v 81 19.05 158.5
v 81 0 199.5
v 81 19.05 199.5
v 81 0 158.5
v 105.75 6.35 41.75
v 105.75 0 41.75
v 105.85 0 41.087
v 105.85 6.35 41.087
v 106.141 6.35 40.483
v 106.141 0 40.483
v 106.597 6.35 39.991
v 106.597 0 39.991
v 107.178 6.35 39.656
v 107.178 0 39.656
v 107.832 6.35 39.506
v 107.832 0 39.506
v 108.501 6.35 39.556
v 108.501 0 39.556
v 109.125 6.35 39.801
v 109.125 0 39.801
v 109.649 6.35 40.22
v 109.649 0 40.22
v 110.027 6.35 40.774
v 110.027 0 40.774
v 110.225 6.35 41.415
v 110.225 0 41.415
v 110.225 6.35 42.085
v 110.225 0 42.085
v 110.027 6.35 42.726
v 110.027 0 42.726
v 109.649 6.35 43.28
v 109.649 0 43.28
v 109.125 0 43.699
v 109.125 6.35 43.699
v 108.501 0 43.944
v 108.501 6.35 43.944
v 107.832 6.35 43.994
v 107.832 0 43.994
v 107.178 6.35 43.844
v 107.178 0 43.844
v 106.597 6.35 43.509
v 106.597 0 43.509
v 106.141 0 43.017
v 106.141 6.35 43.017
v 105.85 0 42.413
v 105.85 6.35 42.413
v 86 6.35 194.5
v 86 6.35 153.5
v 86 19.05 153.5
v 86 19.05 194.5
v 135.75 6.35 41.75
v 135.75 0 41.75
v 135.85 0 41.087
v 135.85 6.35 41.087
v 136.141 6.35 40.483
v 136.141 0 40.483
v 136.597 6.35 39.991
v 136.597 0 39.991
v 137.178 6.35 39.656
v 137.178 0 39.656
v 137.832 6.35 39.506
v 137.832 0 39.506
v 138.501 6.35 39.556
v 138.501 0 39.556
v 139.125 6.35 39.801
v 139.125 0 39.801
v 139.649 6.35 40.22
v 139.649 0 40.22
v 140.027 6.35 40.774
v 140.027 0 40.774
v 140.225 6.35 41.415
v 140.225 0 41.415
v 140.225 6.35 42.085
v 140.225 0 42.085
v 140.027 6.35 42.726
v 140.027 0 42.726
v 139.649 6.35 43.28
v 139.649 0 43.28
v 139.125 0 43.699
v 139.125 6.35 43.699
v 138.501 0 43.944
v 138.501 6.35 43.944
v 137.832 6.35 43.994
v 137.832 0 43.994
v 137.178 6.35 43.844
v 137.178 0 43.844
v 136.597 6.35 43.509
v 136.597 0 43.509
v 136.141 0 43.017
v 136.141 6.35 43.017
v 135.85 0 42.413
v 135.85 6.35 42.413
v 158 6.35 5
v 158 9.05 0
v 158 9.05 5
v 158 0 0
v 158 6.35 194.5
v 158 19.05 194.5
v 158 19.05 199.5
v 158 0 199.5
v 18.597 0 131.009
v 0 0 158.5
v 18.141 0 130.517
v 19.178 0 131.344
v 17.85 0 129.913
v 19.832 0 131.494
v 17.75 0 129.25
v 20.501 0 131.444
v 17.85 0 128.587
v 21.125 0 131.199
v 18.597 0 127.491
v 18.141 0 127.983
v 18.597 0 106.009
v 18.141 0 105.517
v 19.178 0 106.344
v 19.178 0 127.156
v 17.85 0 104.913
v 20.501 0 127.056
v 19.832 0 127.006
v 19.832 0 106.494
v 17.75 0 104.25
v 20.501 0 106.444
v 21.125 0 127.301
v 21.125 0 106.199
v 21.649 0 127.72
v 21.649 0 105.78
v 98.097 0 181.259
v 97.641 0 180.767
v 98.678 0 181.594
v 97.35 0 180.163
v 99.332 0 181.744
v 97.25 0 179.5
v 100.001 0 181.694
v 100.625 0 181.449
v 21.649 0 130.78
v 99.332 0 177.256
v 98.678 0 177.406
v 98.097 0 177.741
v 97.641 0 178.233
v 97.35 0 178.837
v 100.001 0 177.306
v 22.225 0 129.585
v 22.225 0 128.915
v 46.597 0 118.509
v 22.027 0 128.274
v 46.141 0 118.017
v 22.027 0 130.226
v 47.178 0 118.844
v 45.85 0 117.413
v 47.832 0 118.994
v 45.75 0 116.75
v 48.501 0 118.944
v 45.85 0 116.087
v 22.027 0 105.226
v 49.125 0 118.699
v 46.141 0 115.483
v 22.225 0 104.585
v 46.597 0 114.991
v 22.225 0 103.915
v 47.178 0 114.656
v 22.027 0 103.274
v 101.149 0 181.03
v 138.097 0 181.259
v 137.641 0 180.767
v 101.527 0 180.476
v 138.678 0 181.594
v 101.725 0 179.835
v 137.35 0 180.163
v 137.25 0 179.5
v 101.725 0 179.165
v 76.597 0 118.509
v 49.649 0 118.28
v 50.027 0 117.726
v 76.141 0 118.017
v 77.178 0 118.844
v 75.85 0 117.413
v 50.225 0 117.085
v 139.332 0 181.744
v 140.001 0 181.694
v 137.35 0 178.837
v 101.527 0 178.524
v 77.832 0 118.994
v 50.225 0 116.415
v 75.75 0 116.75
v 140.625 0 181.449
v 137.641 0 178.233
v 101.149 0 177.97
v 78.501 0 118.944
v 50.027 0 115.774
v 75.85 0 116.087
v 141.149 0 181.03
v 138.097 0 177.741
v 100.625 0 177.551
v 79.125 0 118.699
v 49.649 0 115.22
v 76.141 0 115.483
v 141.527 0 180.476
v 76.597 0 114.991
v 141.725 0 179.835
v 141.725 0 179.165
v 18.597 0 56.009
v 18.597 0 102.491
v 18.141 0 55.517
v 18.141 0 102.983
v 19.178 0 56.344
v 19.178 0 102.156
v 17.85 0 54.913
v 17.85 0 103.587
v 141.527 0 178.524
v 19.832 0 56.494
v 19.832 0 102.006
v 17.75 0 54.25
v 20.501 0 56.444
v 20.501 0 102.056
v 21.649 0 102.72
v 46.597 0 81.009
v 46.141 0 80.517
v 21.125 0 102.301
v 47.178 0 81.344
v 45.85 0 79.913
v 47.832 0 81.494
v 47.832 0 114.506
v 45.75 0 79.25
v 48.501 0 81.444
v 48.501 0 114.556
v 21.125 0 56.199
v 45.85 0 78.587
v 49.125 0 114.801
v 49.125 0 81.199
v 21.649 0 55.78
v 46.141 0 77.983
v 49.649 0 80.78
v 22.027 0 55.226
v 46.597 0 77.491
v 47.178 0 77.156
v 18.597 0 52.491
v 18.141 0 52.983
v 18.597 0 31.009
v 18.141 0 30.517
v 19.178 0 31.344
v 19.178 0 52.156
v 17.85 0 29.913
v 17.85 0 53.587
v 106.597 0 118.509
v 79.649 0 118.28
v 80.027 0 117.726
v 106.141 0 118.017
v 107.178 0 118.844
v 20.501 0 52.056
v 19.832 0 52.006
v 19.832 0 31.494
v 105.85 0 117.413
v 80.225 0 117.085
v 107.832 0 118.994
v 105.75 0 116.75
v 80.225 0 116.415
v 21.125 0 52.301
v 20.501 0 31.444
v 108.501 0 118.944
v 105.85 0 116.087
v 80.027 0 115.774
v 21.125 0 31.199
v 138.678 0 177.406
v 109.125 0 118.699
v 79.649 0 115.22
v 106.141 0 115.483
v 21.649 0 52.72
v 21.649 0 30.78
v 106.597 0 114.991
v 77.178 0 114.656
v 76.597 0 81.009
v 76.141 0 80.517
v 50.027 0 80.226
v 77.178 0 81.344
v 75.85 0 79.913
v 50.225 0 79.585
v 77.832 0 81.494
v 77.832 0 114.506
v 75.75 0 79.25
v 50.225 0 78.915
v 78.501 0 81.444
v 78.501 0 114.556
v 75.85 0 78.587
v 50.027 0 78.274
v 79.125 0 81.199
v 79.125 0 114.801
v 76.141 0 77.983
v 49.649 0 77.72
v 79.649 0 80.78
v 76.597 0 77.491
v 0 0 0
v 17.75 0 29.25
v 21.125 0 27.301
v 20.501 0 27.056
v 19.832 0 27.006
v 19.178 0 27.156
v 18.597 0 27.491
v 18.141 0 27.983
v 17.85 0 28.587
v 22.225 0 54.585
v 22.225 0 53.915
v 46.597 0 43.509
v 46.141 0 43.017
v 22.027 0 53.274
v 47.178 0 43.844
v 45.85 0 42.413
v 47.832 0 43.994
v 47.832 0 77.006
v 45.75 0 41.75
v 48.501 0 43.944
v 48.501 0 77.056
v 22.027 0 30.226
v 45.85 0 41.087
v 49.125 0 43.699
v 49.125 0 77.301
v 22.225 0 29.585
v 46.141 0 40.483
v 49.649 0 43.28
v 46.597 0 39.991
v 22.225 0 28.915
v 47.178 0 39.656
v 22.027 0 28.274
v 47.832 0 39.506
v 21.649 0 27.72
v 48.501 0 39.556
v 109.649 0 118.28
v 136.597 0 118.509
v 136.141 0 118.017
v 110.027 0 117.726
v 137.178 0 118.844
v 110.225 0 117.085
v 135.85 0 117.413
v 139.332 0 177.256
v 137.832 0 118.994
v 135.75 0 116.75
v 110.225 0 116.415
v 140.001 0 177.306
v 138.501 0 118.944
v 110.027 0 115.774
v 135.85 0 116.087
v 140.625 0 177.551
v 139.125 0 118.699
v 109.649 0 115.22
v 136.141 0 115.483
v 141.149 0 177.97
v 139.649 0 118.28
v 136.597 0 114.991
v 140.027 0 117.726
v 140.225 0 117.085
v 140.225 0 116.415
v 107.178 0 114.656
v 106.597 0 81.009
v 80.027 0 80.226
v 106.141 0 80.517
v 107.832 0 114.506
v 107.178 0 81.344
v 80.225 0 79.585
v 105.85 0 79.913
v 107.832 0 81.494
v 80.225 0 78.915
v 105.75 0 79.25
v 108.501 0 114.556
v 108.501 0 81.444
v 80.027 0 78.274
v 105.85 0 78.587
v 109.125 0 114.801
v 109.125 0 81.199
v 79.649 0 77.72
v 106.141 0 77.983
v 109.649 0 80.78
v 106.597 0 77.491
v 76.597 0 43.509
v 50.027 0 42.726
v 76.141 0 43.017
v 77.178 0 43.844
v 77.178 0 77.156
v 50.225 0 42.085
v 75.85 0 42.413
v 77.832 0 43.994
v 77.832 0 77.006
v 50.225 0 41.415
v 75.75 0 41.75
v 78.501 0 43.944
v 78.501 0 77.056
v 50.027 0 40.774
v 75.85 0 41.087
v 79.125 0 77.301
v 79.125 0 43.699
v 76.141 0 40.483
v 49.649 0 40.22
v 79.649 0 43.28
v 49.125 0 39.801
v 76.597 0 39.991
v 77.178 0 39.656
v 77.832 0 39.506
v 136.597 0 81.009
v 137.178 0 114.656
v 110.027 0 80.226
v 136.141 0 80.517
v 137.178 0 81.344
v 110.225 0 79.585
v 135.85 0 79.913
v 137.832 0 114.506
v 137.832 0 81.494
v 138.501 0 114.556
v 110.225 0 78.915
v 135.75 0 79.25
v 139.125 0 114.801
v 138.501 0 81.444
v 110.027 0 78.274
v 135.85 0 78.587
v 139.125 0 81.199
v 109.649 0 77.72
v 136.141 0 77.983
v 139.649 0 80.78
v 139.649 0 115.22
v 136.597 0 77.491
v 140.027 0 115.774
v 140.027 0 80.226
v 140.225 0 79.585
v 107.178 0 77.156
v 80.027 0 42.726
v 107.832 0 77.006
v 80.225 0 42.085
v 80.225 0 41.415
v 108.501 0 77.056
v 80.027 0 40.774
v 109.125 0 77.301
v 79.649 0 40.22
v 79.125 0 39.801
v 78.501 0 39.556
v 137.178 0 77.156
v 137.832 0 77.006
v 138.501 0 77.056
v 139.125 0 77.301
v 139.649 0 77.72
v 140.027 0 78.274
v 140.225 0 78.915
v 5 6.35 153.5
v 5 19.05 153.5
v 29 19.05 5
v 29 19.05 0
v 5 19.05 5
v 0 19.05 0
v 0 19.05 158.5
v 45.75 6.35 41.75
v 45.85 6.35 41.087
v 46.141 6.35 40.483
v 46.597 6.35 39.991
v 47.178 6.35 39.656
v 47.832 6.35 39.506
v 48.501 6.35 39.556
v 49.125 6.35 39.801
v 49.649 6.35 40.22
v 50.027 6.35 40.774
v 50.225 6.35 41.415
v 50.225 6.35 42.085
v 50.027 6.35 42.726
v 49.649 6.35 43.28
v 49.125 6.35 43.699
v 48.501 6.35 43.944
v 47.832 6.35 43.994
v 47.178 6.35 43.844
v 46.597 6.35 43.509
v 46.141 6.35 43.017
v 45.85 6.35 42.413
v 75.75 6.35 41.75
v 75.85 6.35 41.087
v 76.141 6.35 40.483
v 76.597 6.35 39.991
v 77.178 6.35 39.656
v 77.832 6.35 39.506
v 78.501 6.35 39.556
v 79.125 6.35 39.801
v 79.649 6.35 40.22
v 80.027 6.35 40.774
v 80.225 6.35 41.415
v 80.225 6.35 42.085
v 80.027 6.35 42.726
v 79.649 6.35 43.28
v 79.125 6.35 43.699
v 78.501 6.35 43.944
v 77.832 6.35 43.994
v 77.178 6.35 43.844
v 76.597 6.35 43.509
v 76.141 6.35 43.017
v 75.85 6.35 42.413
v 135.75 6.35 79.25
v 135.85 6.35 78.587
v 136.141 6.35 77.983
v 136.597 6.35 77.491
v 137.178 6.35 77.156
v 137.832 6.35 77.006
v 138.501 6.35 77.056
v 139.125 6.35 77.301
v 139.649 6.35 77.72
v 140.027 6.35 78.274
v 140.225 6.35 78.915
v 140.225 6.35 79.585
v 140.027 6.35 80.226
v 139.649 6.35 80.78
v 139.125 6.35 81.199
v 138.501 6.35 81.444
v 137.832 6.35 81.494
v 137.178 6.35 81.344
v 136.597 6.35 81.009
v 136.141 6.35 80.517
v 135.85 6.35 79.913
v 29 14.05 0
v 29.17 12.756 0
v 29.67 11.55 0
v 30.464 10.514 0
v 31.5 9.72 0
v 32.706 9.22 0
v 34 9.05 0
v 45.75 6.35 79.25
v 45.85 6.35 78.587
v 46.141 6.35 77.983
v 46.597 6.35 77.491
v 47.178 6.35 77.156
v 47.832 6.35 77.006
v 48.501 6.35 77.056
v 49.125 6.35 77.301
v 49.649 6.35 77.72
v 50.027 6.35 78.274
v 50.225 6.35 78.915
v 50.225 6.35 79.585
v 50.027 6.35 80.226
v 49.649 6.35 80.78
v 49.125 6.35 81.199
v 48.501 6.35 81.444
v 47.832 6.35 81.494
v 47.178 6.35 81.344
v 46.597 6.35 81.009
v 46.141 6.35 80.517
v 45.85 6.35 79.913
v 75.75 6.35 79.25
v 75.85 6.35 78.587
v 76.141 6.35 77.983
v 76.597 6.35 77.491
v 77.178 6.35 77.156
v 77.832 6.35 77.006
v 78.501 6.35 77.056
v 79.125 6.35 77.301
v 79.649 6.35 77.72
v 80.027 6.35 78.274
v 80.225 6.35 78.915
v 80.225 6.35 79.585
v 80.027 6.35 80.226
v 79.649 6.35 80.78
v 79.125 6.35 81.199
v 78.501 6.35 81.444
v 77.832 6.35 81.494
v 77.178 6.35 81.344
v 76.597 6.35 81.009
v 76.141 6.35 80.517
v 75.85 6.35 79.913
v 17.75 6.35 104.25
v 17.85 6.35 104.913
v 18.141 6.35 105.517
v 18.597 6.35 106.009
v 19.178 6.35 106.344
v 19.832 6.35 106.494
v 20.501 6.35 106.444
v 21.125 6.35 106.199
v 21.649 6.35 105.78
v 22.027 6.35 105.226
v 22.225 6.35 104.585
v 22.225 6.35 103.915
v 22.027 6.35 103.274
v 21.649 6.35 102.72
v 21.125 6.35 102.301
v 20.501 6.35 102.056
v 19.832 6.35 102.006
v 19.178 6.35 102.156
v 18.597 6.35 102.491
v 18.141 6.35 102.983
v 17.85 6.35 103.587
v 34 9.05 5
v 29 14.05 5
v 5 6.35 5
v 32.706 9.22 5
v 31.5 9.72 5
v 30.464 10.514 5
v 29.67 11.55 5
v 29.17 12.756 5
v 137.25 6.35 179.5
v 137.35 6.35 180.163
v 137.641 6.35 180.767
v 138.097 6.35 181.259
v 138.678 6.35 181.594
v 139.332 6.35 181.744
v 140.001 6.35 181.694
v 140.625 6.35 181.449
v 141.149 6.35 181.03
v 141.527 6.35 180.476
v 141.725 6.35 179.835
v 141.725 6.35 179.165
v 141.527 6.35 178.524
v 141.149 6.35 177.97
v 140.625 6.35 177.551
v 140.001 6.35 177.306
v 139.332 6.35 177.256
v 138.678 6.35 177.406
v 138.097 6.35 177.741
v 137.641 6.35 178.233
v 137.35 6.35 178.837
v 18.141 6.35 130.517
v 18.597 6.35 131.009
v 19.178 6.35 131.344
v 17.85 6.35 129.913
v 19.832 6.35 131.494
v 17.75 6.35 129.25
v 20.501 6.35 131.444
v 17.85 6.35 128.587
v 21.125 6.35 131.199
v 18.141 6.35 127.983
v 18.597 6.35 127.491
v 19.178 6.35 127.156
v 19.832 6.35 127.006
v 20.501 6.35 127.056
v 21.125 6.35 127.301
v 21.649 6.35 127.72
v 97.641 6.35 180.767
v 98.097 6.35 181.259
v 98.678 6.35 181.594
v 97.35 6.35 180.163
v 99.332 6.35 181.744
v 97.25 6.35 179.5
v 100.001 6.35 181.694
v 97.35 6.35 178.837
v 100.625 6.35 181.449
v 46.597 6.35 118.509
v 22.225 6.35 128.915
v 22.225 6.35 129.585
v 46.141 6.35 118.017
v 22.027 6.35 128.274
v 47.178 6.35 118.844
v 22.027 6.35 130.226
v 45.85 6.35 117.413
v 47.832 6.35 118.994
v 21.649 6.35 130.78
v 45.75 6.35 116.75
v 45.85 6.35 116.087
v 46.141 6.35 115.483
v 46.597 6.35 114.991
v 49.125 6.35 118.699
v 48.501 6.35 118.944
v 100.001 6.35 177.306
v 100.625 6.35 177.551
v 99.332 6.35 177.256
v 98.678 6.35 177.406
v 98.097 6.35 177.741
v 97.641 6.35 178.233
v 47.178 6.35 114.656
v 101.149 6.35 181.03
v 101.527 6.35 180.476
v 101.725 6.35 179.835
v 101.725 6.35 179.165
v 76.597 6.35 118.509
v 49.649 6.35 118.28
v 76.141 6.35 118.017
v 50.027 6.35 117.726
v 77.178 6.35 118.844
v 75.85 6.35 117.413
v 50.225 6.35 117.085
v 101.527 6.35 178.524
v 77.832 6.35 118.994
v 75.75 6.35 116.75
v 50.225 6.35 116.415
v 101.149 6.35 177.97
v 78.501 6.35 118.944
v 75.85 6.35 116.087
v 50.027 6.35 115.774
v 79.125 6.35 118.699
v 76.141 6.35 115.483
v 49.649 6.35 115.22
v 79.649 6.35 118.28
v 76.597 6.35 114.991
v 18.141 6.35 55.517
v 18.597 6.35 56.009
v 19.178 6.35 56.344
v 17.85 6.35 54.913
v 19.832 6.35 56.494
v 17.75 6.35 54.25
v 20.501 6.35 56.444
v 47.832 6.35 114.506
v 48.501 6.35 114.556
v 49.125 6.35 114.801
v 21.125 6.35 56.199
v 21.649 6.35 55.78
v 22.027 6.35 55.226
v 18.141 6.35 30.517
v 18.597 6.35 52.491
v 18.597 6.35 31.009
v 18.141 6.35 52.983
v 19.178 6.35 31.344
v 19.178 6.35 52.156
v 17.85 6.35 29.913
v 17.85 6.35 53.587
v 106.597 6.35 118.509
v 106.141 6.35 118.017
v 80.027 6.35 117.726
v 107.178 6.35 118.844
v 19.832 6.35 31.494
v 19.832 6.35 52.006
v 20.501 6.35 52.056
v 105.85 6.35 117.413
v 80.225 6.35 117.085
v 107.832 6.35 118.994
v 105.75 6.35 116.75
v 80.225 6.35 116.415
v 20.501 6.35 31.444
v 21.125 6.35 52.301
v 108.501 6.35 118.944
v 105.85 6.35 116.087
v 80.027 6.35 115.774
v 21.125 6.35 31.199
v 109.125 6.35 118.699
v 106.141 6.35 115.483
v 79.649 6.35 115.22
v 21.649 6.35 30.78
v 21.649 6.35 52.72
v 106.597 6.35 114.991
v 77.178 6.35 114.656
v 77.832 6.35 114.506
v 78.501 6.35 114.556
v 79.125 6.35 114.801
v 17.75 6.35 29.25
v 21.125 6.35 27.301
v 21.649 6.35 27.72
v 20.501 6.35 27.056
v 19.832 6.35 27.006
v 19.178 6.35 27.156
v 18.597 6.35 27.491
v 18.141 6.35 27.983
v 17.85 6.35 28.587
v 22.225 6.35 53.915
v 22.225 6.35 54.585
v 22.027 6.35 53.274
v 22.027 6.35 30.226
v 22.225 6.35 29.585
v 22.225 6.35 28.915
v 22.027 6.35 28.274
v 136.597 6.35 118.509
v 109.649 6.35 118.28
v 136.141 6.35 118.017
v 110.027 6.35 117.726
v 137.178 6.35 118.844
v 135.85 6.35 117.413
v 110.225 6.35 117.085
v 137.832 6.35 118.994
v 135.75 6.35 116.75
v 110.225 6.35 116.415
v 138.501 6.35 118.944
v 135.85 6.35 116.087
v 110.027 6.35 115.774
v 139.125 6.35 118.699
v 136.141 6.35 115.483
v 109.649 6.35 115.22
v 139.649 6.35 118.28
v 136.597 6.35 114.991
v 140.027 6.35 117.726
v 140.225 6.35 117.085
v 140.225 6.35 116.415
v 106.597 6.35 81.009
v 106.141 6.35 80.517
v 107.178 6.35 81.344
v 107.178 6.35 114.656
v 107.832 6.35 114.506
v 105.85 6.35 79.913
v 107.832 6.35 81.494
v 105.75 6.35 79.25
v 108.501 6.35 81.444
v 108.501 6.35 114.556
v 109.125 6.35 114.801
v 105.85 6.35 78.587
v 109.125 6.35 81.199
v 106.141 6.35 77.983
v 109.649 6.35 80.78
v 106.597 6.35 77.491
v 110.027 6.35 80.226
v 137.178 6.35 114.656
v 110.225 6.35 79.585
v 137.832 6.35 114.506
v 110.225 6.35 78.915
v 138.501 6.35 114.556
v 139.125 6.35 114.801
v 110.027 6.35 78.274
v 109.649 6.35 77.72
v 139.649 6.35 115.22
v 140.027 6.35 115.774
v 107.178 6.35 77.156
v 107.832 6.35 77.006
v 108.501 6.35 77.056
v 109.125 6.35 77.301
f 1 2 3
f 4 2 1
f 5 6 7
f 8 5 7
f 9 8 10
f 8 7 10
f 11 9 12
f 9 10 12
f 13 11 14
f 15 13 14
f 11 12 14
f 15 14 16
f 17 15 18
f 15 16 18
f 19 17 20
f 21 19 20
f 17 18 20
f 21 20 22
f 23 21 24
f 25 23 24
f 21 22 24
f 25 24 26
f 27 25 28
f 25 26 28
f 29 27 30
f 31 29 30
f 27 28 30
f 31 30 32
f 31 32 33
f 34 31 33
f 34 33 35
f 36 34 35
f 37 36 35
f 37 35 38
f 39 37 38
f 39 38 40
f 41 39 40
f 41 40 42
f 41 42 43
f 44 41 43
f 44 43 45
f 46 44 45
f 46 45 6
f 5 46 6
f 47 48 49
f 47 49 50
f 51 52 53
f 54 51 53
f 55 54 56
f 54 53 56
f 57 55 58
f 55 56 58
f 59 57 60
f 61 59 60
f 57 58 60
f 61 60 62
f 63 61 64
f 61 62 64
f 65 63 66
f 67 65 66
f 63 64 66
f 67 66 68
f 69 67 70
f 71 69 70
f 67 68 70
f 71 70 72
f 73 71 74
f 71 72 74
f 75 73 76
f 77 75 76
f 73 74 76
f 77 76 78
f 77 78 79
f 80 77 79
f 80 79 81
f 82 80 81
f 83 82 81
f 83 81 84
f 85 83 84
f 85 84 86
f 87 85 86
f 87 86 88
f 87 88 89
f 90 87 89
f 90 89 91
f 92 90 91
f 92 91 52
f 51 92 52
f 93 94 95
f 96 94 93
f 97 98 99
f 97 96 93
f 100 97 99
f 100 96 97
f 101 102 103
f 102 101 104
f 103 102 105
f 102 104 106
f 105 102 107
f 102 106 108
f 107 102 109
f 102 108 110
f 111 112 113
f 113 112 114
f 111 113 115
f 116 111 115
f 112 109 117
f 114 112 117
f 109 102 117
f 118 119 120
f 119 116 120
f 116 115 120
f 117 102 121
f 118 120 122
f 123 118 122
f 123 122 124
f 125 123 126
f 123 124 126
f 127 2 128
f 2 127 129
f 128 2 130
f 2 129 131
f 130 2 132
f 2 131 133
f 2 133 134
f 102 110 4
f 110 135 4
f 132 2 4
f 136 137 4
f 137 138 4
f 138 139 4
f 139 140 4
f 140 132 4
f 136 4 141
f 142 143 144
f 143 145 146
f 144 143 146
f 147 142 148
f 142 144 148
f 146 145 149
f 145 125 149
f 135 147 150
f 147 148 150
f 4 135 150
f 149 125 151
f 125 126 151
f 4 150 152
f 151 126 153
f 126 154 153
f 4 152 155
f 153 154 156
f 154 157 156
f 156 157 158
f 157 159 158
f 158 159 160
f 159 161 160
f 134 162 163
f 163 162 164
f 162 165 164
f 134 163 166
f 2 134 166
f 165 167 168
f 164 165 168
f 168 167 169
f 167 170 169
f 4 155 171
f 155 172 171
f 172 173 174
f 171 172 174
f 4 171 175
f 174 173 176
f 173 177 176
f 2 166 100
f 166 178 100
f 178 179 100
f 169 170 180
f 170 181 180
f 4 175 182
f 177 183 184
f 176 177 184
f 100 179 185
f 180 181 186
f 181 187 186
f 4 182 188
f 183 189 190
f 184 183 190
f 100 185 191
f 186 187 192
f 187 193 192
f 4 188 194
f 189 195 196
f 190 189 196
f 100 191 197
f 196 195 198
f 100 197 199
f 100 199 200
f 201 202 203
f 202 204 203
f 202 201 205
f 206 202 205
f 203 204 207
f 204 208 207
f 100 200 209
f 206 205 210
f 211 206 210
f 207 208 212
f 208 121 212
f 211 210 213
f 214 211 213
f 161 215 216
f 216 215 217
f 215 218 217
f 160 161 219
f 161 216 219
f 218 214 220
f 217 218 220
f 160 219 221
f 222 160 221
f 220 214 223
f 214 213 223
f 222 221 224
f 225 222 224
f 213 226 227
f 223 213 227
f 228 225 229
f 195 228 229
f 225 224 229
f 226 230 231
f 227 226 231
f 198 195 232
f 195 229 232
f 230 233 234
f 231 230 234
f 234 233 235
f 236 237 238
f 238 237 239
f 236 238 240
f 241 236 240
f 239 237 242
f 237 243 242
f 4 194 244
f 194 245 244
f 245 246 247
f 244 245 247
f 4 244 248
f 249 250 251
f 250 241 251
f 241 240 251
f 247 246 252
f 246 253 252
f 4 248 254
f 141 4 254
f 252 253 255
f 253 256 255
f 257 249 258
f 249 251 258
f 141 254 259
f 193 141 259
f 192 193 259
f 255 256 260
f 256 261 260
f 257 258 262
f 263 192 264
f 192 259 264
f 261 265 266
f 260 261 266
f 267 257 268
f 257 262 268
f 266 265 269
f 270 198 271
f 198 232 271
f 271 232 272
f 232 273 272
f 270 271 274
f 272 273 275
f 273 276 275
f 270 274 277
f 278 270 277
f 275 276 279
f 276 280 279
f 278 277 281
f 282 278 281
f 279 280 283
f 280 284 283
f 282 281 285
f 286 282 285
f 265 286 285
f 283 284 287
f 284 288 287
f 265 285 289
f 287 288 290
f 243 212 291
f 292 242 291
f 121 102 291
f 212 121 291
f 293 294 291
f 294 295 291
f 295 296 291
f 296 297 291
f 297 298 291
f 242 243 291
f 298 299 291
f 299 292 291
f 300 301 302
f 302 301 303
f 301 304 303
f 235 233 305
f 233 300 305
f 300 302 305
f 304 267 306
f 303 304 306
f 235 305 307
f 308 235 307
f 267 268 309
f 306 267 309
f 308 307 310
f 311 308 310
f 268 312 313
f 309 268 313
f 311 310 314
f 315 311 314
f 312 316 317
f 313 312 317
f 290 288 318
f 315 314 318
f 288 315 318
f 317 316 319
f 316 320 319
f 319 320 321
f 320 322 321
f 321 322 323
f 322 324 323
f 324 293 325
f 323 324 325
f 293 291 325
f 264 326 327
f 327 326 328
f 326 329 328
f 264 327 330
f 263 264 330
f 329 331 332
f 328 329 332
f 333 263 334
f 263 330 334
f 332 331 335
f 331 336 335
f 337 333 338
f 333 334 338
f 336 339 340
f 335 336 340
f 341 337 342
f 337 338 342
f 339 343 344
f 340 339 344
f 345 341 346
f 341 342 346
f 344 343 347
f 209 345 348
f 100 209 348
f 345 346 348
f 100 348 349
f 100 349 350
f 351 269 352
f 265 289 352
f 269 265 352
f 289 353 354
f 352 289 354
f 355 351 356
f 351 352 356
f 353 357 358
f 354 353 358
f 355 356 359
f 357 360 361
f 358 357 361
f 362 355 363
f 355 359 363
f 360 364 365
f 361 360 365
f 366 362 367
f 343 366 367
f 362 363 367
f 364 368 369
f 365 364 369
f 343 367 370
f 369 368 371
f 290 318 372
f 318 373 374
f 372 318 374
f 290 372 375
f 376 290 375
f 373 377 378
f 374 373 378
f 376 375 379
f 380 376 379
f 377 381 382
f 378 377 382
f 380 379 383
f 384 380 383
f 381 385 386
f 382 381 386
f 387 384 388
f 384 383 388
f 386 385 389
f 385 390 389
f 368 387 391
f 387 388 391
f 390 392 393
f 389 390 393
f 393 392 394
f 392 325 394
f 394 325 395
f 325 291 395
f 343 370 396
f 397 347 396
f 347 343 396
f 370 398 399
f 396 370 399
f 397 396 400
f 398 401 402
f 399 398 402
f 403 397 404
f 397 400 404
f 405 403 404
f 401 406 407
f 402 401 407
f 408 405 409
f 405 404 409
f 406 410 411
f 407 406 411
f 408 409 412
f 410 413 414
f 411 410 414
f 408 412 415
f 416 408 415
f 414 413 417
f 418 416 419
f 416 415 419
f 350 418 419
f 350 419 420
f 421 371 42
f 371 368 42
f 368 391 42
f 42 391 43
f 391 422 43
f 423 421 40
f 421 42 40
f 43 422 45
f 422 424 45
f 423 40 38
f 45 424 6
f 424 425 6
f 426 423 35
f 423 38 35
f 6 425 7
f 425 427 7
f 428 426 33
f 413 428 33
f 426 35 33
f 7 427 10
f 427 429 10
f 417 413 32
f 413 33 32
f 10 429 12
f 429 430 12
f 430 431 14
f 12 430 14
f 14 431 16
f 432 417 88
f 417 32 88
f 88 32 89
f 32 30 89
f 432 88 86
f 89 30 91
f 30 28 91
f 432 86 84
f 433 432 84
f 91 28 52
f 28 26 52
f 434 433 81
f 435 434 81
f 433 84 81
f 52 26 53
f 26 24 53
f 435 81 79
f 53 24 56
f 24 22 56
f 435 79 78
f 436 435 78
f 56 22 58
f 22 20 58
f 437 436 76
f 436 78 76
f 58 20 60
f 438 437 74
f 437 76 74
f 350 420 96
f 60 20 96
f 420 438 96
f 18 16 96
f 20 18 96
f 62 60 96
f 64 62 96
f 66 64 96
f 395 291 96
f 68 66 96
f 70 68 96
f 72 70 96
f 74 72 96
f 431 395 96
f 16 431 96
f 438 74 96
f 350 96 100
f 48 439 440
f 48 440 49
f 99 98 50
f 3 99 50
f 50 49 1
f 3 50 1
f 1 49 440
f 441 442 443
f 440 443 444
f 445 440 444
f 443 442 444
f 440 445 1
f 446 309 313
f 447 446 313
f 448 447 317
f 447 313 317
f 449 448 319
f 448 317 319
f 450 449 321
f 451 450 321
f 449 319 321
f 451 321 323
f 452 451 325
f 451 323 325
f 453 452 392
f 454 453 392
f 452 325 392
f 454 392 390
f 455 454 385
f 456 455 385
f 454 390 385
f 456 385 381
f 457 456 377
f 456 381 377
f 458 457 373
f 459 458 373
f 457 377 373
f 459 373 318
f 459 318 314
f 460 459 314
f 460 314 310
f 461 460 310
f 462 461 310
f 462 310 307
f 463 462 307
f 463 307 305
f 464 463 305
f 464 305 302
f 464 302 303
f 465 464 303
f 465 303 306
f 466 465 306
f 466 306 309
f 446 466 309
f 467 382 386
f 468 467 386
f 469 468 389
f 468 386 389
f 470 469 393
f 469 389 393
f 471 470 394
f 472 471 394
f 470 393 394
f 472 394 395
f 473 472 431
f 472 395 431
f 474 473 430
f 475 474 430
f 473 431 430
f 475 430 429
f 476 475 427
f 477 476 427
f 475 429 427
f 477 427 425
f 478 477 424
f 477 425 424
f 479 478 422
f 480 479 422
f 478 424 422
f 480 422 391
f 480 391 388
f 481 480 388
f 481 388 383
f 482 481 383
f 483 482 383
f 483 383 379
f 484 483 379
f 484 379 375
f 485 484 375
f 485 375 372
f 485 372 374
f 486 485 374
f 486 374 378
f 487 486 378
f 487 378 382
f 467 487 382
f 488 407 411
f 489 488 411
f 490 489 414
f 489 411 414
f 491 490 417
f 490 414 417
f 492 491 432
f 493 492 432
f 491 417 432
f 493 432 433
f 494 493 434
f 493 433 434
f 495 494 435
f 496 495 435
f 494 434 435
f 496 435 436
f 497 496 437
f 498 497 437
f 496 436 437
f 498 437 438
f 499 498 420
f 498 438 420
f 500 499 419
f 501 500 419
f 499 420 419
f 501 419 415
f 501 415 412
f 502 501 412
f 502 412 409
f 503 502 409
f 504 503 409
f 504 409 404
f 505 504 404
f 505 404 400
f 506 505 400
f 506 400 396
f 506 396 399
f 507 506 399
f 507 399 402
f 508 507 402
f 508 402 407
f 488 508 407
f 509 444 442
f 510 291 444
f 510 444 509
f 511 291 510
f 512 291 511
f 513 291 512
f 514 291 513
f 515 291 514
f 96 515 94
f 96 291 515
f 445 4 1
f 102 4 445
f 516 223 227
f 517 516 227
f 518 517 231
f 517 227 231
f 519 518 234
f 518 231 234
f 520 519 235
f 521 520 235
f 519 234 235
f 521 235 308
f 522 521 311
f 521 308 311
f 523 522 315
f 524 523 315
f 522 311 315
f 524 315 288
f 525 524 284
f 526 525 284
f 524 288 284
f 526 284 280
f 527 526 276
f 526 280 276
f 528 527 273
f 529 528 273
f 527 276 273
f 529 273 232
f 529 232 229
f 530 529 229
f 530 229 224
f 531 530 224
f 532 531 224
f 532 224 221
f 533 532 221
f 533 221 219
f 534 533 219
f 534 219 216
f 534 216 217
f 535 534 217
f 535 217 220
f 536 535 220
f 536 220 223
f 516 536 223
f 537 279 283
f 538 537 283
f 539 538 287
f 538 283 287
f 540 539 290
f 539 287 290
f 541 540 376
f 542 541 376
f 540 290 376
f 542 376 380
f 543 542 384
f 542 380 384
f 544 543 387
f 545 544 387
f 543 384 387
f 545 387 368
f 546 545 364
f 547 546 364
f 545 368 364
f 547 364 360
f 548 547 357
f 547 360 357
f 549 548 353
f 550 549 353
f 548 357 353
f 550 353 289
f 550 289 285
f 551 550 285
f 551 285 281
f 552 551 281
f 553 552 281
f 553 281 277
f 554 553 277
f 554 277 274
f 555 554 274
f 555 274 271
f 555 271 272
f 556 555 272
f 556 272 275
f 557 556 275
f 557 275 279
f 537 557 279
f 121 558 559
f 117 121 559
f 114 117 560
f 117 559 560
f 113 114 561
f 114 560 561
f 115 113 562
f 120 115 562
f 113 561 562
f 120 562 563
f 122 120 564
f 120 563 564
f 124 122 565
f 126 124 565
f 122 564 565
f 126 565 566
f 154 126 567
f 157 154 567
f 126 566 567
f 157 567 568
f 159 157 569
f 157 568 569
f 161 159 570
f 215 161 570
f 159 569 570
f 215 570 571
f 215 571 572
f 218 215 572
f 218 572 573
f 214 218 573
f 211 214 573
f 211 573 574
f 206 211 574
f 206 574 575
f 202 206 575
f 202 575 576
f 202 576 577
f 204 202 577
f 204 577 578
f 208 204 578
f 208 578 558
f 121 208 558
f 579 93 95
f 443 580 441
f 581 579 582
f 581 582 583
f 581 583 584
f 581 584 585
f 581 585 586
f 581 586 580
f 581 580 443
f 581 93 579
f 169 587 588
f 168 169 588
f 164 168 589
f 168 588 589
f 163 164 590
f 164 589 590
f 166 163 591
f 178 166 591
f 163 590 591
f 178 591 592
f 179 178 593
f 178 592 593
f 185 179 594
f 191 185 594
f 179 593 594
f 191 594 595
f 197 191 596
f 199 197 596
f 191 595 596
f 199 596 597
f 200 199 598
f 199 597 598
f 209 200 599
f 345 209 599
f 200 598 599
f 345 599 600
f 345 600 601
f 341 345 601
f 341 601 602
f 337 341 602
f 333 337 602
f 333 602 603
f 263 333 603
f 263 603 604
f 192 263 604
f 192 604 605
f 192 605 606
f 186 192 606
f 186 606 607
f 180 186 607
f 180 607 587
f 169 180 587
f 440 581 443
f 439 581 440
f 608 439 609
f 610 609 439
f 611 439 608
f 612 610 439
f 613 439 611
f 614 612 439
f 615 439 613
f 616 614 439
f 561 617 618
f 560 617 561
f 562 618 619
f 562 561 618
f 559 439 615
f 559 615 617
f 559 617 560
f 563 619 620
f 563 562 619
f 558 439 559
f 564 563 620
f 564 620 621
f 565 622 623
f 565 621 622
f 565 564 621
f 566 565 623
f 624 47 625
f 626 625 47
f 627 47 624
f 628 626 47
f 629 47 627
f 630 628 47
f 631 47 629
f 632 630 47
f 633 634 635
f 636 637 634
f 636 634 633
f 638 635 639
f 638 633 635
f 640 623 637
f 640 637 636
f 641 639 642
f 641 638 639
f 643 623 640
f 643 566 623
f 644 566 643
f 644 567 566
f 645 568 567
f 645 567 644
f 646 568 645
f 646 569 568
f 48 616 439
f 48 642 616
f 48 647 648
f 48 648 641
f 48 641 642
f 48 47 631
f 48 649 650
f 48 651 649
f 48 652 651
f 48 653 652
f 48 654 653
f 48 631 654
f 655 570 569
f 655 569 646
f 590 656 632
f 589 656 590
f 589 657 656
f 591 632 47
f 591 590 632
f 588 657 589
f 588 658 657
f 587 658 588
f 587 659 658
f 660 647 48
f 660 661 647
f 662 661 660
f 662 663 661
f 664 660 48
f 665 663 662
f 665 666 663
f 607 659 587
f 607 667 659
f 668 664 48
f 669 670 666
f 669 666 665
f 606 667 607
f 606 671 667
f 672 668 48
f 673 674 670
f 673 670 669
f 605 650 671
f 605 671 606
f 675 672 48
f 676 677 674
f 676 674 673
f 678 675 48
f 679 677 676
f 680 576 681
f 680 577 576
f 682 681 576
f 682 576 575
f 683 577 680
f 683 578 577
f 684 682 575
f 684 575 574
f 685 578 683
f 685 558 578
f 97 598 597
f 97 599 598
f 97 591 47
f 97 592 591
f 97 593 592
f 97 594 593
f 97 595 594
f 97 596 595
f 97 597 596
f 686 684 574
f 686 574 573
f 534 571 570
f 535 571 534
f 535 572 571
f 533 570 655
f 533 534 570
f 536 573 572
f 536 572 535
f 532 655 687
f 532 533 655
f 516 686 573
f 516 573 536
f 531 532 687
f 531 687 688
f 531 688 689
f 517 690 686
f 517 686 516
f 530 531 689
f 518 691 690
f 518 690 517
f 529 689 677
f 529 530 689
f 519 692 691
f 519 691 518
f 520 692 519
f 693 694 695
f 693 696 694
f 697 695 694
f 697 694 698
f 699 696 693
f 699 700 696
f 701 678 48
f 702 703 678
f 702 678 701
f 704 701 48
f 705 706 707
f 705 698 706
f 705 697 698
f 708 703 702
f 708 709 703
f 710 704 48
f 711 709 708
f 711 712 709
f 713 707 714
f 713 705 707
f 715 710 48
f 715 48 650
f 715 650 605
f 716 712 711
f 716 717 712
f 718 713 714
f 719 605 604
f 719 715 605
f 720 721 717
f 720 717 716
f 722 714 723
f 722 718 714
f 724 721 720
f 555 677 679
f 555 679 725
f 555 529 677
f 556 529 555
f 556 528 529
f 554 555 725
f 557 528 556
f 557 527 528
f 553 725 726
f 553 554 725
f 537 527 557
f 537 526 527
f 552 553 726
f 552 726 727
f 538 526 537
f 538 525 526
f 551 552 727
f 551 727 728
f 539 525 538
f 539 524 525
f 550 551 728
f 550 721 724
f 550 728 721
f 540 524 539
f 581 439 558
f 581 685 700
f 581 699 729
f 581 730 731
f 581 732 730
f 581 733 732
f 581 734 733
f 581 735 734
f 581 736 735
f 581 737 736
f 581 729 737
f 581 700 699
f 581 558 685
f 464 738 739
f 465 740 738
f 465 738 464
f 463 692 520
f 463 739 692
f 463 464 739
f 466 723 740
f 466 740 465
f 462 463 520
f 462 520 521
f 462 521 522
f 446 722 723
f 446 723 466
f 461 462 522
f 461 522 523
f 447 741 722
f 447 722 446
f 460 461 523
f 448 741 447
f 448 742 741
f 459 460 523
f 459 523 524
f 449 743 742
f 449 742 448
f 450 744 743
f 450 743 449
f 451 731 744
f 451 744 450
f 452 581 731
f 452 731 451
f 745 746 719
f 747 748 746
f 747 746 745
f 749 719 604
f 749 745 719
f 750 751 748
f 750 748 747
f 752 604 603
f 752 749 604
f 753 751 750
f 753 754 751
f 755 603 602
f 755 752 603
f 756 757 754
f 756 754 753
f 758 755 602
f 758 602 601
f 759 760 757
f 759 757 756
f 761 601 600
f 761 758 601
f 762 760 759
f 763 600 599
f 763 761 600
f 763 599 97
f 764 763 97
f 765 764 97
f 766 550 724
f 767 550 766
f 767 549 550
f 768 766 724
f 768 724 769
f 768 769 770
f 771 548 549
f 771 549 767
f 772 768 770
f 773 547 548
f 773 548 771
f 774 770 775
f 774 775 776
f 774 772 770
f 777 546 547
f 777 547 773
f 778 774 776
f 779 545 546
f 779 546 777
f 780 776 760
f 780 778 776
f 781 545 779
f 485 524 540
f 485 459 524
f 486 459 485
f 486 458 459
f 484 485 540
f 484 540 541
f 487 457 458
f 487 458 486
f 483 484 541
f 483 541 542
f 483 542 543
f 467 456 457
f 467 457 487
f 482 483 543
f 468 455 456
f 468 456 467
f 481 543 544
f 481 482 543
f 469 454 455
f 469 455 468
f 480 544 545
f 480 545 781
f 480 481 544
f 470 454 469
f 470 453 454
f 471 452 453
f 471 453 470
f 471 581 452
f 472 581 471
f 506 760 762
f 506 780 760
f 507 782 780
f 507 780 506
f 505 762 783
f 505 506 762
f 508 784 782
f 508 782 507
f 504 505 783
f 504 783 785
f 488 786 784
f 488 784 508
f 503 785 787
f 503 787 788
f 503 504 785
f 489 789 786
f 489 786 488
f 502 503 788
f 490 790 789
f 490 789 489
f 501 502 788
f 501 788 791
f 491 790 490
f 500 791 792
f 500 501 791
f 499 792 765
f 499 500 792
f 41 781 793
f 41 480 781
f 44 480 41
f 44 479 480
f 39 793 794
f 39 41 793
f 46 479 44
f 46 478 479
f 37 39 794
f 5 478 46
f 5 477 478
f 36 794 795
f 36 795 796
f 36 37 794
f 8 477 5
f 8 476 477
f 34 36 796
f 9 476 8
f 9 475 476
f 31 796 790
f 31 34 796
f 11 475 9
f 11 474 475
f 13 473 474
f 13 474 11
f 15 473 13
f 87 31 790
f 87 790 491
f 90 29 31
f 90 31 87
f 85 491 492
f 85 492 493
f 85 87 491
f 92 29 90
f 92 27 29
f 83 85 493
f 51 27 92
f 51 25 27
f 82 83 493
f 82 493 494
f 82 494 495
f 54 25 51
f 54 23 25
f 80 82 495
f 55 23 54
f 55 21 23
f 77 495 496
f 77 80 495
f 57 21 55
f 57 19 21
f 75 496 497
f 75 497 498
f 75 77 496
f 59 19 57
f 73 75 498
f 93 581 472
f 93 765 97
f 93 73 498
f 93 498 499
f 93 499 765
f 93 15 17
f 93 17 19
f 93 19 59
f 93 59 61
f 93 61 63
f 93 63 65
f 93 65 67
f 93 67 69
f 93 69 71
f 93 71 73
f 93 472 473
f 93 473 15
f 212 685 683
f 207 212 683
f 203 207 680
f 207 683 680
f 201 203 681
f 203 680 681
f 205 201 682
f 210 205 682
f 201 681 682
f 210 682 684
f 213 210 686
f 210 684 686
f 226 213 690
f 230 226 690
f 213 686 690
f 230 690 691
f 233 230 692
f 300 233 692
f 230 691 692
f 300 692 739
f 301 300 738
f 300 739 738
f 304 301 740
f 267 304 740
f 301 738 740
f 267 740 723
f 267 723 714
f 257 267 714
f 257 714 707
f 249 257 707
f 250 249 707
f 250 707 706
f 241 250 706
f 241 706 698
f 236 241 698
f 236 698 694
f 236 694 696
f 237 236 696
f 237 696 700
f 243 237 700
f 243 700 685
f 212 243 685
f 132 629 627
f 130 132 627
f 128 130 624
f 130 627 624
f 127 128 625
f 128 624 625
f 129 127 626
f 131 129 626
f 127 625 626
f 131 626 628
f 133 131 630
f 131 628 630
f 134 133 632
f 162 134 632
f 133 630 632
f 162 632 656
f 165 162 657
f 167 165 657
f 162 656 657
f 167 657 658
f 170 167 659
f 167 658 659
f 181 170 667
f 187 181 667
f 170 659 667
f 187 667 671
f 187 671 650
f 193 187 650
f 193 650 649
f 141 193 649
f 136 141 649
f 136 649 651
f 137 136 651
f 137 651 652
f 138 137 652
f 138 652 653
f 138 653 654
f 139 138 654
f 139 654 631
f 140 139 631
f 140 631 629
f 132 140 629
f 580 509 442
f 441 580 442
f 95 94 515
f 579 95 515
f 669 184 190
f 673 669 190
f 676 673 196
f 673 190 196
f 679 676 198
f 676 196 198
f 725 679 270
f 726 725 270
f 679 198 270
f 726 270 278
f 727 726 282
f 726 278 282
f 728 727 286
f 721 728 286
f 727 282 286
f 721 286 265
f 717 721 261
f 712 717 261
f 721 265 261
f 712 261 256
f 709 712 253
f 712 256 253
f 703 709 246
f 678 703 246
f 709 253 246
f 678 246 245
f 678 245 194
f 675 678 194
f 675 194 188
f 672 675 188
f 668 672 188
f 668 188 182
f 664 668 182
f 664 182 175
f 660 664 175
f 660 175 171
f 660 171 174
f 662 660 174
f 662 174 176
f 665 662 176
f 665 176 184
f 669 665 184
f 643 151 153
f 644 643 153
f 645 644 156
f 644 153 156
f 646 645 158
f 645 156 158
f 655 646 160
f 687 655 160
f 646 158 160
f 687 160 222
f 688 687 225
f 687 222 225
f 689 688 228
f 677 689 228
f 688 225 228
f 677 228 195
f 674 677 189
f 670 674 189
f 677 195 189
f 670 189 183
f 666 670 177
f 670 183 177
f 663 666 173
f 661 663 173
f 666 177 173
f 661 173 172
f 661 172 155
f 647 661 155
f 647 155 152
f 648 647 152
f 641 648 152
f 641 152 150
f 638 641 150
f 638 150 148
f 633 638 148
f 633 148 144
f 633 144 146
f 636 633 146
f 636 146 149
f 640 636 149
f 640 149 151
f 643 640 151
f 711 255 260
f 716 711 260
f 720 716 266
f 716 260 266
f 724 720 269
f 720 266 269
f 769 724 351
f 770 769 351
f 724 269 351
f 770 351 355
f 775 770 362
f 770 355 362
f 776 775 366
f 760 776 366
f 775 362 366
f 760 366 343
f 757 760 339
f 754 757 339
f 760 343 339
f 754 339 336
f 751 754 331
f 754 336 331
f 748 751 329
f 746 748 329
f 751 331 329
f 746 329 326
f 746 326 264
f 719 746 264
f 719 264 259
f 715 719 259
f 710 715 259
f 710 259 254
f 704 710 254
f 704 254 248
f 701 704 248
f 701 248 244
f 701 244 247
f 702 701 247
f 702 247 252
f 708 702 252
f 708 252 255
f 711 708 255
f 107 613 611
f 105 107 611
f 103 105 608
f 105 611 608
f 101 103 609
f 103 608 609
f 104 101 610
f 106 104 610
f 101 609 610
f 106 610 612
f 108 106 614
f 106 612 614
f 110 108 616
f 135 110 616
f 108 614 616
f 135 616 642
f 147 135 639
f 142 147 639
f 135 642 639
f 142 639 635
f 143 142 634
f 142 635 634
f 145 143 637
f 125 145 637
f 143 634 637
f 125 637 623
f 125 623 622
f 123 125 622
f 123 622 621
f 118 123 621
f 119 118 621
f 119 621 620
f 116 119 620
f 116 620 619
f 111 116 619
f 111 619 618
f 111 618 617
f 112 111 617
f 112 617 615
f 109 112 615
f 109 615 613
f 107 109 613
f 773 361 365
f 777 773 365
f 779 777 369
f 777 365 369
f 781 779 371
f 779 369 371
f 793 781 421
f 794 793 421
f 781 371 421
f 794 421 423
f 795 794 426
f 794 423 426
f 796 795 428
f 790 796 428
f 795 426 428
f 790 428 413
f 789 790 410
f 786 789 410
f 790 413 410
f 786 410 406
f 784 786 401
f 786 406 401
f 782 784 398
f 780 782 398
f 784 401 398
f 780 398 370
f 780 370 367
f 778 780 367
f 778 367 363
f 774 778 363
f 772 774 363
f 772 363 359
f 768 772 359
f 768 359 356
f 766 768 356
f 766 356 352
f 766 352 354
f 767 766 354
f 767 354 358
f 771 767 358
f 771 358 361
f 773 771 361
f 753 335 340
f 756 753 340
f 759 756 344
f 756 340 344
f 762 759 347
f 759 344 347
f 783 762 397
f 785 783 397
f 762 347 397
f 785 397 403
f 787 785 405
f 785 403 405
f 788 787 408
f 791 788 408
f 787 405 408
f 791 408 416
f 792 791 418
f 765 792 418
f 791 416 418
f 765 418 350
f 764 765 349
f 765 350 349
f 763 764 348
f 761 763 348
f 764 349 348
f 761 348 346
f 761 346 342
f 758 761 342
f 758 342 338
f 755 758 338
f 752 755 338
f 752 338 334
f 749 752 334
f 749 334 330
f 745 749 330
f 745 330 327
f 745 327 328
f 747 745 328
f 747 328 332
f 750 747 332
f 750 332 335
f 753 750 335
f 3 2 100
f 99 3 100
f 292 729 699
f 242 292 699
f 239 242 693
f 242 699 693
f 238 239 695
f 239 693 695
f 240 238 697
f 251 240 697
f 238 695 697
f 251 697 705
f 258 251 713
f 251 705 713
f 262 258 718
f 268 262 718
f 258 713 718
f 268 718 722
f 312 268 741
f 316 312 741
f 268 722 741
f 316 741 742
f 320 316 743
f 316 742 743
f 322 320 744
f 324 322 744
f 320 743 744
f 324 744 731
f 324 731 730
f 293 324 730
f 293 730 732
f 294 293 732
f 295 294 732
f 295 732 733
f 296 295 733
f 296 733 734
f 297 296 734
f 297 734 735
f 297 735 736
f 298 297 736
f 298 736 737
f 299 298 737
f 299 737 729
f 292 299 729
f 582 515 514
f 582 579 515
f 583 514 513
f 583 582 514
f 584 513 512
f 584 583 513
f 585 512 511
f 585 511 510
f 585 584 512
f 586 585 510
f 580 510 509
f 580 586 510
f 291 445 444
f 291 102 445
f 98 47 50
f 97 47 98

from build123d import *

# Parameters (mm, degrees)
SKETCH1_W                = 158
SKETCH1_H                = 199.5
BOSS_EXTRUDE1_DEPTH      = 6.35
SKETCH2_W                = 81
SKETCH2_H                = 41
CUT_EXTRUDE1_DEPTH       = 7.35
BOSS_EXTRUDE2_DEPTH      = 12.7
M4_CLEARANCE_HOLE1_D     = 4.5
M4_CLEARANCE_HOLE1_DEPTH = 6.35
CUT_EXTRUDE2_REACH       = 201.5
SKETCH7_W                = 129
SKETCH7_H                = 10
FILLET1_R                = 5
M4_CLEARANCE_HOLE2_D     = 4.5
M4_CLEARANCE_HOLE2_DEPTH = 6.35
LPATTERN1_COUNT          = 4
LPATTERN1_PITCH          = 30
LPATTERN1_COUNT_DIR2     = 3
LPATTERN1_PITCH_DIR2     = 37.5


with BuildPart() as part:
    # Sketch1 → Boss-Extrude1 (new body)
    with BuildSketch(Plane(origin=(0, 0, 0), x_dir=(1, 0, 0), z_dir=(0, 1, 0))):
        with Locations((79, -99.75)):
            Rectangle(SKETCH1_W, SKETCH1_H)
    extrude(amount=BOSS_EXTRUDE1_DEPTH)

    # Sketch2 → Cut-Extrude1 (cut, through all)
    with BuildSketch(Plane(origin=(0, 6.35, 0), x_dir=(1, 0, 0), z_dir=(0, 1, 0))):
        with Locations((40.5, -179)):
            Rectangle(SKETCH2_W, SKETCH2_H)
    extrude(amount=-CUT_EXTRUDE1_DEPTH, mode=Mode.SUBTRACT)

    # Sketch3 → Boss-Extrude2 (add)
    with BuildSketch(Plane(origin=(0, 6.35, 0), x_dir=(1, 0, 0), z_dir=(0, 1, 0))):
        Polygon((158, 0), (158, -5), (5, -5), (5, -153.5), (86, -153.5), (86, -194.5), (158, -194.5), (158, -199.5), (86, -199.5), (81, -199.5), (81, -158.5), (0, -158.5), (0, 0), align=None)
    extrude(amount=BOSS_EXTRUDE2_DEPTH)

    # M4 Clearance Hole1
    with Locations(Plane.XZ):
        with Locations((20, 54.25), (99.5, 179.5), (139.5, 179.5), (20, 129.25), (20, 104.25), (20, 29.25)):
            Hole(M4_CLEARANCE_HOLE1_D / 2, depth=M4_CLEARANCE_HOLE1_DEPTH)

    # Sketch7 → Cut-Extrude2 (cut, up to next)
    with BuildSketch(Plane(origin=(0, 0, 0), x_dir=(-1, 0, 0), z_dir=(0, 0, -1)), mode=Mode.PRIVATE) as cut_extrude2_sk1:
        with Locations((-93.5, 14.05)):
            Rectangle(SKETCH7_W, SKETCH7_H)
    cut_extrude2_tool1 = extrude(cut_extrude2_sk1.sketch, amount=-CUT_EXTRUDE2_REACH, mode=Mode.PRIVATE) & part.part
    add(cut_extrude2_tool1.solids().sort_by_distance((93.5, 14.05, 0))[0], mode=Mode.SUBTRACT)

    # Fillet1
    fillet1_edges = [part.edges().sort_by_distance(p)[0] for p in [
        (29, 9.05, 2.5),
    ]]
    fillet(fillet1_edges, radius=FILLET1_R)

    # M4 Clearance Hole2
    with Locations(Plane(origin=(0, 6.35, 0), x_dir=(1, 0, 0), z_dir=(0, 1, 0))):
        with Locations((138, -116.75)):
            m4_clearance_hole2 = Hole(M4_CLEARANCE_HOLE2_D / 2, depth=M4_CLEARANCE_HOLE2_DEPTH)

    # LPattern1: M4 Clearance Hole2 4 × 3
    with Locations(*[(-i * LPATTERN1_PITCH, 0, -j * LPATTERN1_PITCH_DIR2) for i in range(LPATTERN1_COUNT) for j in range(LPATTERN1_COUNT_DIR2) if (i, j) != (0, 0)]):
        add(m4_clearance_hole2, mode=Mode.SUBTRACT)


solid = part.part
